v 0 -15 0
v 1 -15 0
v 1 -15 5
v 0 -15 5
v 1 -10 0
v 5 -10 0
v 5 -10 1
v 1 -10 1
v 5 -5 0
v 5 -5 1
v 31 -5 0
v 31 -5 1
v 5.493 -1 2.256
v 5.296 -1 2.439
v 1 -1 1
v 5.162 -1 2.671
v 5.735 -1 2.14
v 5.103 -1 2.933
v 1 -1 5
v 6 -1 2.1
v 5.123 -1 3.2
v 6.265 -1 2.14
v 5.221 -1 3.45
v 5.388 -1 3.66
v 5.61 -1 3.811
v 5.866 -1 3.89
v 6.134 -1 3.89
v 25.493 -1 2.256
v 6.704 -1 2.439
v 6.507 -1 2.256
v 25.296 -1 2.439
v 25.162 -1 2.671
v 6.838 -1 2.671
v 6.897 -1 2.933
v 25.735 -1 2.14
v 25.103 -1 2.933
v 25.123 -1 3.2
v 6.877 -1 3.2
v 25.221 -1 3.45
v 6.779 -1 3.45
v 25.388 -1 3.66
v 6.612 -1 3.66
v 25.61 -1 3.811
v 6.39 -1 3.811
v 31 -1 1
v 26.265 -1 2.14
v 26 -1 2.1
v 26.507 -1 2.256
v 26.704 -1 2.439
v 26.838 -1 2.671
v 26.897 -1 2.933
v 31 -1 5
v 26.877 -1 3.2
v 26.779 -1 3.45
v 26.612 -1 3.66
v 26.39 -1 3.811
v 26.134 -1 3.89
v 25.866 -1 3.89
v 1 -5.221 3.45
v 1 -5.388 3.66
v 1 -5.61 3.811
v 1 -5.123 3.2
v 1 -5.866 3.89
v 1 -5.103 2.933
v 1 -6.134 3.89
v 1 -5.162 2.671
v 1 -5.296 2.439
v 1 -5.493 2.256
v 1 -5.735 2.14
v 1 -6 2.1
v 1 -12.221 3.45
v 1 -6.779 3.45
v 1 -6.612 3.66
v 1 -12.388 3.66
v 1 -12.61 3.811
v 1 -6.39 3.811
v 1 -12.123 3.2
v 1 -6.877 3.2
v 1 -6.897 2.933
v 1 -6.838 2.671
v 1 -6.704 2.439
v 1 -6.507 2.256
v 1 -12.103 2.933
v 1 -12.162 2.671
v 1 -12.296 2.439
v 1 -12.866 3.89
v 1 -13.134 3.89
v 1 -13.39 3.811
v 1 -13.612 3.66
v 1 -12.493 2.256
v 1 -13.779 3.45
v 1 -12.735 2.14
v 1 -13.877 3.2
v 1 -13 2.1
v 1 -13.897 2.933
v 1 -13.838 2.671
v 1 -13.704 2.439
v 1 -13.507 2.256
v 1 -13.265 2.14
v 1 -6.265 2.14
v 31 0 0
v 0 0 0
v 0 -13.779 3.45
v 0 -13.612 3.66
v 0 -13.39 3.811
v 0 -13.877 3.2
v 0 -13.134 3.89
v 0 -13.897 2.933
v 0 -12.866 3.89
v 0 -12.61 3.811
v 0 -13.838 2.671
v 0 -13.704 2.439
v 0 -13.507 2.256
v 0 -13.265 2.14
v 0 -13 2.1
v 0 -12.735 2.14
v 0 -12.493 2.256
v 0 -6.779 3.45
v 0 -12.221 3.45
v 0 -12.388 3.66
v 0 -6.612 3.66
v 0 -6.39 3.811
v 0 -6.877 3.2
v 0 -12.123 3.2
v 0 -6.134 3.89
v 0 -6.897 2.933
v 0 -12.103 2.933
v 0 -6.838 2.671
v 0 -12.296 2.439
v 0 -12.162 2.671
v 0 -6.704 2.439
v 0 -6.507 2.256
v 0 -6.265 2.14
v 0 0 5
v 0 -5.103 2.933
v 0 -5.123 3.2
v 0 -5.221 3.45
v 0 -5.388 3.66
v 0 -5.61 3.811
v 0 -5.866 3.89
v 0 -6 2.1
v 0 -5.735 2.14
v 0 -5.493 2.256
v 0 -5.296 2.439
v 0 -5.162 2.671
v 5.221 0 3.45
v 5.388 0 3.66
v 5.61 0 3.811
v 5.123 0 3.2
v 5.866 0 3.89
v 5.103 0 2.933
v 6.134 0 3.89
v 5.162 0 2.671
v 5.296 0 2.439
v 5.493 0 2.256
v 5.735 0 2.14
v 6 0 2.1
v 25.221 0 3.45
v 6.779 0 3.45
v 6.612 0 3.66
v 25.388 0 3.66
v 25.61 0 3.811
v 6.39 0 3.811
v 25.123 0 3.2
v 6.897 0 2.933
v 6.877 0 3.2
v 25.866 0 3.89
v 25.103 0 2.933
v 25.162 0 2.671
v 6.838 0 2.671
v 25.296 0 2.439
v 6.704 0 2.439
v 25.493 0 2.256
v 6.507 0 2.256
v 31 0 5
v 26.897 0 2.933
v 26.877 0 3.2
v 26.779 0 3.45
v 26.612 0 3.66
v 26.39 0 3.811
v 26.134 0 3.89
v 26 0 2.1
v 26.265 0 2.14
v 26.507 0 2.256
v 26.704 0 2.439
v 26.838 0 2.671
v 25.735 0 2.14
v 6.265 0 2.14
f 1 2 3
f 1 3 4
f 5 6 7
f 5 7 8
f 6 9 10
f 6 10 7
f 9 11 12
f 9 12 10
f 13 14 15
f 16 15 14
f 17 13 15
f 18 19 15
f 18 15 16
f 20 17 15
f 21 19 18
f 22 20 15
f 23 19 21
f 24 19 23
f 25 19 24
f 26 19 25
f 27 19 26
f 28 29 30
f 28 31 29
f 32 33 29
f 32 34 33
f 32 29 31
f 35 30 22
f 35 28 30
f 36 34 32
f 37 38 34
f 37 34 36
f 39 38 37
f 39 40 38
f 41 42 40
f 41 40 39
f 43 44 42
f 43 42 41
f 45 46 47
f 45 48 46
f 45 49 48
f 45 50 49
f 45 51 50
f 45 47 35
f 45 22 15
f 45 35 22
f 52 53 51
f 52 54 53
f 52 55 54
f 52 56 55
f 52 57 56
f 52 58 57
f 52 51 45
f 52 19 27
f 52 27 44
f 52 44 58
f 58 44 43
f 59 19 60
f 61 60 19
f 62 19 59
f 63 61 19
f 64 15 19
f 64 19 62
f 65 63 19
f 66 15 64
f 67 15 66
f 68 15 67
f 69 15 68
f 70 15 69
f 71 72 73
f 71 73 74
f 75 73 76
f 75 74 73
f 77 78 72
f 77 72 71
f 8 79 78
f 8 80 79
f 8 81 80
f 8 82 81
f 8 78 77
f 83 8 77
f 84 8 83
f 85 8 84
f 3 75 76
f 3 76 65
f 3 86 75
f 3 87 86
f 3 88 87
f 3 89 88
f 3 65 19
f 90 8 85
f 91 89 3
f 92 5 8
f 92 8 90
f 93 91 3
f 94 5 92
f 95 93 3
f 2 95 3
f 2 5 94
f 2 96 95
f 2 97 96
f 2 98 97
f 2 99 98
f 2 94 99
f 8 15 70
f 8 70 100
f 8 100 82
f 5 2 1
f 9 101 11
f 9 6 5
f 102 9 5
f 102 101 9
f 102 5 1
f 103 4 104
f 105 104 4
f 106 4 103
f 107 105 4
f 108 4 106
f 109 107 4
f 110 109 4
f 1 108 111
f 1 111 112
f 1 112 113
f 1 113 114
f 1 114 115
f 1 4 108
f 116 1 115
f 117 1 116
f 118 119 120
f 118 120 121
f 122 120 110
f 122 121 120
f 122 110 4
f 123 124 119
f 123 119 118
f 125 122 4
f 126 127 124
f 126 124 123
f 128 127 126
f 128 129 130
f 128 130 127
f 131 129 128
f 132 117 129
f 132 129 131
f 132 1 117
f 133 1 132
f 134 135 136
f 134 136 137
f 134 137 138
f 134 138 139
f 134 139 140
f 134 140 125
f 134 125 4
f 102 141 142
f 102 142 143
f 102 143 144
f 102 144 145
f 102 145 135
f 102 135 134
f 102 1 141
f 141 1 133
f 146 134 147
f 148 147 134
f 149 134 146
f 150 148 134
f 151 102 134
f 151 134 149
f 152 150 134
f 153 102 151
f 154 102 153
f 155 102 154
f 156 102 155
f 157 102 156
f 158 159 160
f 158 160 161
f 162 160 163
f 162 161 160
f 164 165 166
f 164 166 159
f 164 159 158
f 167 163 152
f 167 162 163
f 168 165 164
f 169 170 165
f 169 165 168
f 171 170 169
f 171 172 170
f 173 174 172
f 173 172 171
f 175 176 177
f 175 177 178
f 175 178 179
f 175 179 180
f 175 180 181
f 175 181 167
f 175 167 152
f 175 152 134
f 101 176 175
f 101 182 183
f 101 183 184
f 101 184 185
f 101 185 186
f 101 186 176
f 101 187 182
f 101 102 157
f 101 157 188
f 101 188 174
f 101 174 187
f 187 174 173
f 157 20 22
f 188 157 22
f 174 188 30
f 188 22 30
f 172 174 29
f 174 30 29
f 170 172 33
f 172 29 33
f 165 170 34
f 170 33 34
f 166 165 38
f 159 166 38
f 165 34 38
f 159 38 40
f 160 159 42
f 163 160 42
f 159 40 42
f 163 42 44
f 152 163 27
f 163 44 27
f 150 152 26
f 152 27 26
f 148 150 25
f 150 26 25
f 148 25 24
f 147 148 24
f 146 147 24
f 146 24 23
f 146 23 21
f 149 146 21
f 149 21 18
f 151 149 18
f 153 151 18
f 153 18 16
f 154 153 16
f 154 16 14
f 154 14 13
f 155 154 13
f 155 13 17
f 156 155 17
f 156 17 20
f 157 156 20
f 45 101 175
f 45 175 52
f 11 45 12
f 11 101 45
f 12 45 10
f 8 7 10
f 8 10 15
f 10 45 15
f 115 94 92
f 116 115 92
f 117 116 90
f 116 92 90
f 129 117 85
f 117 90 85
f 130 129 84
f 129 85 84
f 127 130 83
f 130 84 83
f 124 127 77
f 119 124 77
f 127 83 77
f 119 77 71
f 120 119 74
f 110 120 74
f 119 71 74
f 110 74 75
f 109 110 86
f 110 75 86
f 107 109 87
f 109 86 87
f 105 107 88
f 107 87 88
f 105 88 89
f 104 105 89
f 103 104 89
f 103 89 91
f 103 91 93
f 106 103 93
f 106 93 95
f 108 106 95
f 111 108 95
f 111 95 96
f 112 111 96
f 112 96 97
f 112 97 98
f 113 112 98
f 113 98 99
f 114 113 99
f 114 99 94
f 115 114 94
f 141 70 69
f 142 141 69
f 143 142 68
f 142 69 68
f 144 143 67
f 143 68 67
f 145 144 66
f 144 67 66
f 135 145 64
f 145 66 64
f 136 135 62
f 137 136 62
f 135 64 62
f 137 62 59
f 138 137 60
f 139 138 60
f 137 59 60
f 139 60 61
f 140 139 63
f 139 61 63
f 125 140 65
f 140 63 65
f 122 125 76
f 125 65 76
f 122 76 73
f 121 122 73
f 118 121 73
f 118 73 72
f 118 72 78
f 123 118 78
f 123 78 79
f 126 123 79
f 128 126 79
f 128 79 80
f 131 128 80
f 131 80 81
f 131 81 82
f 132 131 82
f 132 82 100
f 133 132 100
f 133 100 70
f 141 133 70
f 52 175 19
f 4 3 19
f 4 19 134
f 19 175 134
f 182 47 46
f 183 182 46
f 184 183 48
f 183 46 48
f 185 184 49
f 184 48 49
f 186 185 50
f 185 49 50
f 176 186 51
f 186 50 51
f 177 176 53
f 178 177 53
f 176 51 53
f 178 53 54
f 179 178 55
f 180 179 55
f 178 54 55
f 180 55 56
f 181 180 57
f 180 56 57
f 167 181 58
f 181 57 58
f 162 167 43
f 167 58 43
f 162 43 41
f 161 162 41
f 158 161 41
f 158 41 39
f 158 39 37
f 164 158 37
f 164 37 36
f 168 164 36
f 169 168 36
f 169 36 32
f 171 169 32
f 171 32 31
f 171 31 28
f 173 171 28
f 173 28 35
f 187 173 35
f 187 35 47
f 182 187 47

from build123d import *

# Parameters (mm, degrees)
BOSS_EXTRU_1_DEPTH      = 5
ENL_V_MAT_EXTRU_1_DEPTH = 4
ESQUISSE3_R             = 0.9
ENL_V_MAT_EXTRU_2_DEPTH = 10
ESQUISSE4_R             = 0.9
ENL_V_MAT_EXTRU_3_DEPTH = 10


with BuildPart() as part:
    # Esquisse1 → Boss.-Extru.1 (new body)
    with BuildSketch(Plane.XY):
        Polygon((0, 0), (31, 0), (31, -5), (5, -5), (5, -10), (1, -10), (1, -15), (0, -15), align=None)
    extrude(amount=BOSS_EXTRU_1_DEPTH)

    # Esquisse2 → Enlèv. mat.-Extru.1 (cut)
    with BuildSketch(Plane.XY.offset(5)):
        Polygon((1, -10), (1, -1), (31, -1), (31, -5), (5, -5), (5, -10), align=None)
    extrude(amount=-ENL_V_MAT_EXTRU_1_DEPTH, mode=Mode.SUBTRACT)

    # Esquisse3 → Enlèv. mat.-Extru.2 (cut)
    with BuildSketch(Plane(origin=(1, 0, 0), x_dir=(0, 0, -1), z_dir=(1, 0, 0))):
        with Locations((-3, -6)):
            Circle(ESQUISSE3_R)
        with Locations((-3, -13)):
            Circle(ESQUISSE3_R)
    extrude(amount=-ENL_V_MAT_EXTRU_2_DEPTH, mode=Mode.SUBTRACT)

    # Esquisse4 → Enlèv. mat.-Extru.3 (cut)
    with BuildSketch(Plane.XZ.offset(1)):
        with Locations(Location((6, 3, 0), (0, 0, 270))):
            Circle(ESQUISSE4_R)
        with Locations(Location((26, 3, 0), (0, 0, 270))):
            Circle(ESQUISSE4_R)
    extrude(amount=-ENL_V_MAT_EXTRU_3_DEPTH, mode=Mode.SUBTRACT)


solid = part.part
